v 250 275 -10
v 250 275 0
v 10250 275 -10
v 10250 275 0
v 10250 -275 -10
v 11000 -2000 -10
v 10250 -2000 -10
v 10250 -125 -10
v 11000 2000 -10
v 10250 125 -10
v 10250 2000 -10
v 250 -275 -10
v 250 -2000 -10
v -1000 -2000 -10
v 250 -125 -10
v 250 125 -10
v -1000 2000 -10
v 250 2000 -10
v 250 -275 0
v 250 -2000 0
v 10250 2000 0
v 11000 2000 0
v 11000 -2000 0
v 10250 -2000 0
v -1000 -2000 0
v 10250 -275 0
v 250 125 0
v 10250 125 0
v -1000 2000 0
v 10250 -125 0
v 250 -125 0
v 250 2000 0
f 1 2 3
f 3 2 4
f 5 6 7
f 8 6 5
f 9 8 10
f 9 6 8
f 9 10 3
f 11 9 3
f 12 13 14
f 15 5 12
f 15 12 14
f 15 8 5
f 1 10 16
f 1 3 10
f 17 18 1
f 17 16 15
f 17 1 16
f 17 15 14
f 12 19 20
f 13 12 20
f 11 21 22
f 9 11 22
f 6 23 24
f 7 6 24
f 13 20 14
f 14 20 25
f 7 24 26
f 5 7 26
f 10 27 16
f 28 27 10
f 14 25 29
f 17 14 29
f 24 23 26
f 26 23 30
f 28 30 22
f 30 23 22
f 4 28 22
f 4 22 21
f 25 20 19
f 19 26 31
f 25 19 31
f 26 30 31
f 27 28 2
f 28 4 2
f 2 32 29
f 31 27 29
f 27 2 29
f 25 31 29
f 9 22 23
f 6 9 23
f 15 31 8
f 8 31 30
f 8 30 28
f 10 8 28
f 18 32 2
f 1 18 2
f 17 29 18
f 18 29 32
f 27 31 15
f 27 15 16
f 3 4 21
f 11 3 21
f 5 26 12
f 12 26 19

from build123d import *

# Parameters (mm, degrees)
SKETCH2_W           = 10000
SKETCH2_H           = 250
BOSS_EXTRUDE1_DEPTH = 10


with BuildPart() as part:
    # Sketch2 → Boss-Extrude1 (new body)
    with BuildSketch(Plane.XY):
        Polygon((250, 2000), (250, 275), (10250, 275), (10250, 2000), (11000, 2000), (11000, -2000), (10250, -2000), (10250, -275), (250, -275), (250, -2000), (-1000, -2000), (-1000, 2000), align=None)
        with Locations((5250, 0)):
            Rectangle(SKETCH2_W, SKETCH2_H, mode=Mode.SUBTRACT)
    extrude(amount=-BOSS_EXTRUDE1_DEPTH)


solid = part.part
